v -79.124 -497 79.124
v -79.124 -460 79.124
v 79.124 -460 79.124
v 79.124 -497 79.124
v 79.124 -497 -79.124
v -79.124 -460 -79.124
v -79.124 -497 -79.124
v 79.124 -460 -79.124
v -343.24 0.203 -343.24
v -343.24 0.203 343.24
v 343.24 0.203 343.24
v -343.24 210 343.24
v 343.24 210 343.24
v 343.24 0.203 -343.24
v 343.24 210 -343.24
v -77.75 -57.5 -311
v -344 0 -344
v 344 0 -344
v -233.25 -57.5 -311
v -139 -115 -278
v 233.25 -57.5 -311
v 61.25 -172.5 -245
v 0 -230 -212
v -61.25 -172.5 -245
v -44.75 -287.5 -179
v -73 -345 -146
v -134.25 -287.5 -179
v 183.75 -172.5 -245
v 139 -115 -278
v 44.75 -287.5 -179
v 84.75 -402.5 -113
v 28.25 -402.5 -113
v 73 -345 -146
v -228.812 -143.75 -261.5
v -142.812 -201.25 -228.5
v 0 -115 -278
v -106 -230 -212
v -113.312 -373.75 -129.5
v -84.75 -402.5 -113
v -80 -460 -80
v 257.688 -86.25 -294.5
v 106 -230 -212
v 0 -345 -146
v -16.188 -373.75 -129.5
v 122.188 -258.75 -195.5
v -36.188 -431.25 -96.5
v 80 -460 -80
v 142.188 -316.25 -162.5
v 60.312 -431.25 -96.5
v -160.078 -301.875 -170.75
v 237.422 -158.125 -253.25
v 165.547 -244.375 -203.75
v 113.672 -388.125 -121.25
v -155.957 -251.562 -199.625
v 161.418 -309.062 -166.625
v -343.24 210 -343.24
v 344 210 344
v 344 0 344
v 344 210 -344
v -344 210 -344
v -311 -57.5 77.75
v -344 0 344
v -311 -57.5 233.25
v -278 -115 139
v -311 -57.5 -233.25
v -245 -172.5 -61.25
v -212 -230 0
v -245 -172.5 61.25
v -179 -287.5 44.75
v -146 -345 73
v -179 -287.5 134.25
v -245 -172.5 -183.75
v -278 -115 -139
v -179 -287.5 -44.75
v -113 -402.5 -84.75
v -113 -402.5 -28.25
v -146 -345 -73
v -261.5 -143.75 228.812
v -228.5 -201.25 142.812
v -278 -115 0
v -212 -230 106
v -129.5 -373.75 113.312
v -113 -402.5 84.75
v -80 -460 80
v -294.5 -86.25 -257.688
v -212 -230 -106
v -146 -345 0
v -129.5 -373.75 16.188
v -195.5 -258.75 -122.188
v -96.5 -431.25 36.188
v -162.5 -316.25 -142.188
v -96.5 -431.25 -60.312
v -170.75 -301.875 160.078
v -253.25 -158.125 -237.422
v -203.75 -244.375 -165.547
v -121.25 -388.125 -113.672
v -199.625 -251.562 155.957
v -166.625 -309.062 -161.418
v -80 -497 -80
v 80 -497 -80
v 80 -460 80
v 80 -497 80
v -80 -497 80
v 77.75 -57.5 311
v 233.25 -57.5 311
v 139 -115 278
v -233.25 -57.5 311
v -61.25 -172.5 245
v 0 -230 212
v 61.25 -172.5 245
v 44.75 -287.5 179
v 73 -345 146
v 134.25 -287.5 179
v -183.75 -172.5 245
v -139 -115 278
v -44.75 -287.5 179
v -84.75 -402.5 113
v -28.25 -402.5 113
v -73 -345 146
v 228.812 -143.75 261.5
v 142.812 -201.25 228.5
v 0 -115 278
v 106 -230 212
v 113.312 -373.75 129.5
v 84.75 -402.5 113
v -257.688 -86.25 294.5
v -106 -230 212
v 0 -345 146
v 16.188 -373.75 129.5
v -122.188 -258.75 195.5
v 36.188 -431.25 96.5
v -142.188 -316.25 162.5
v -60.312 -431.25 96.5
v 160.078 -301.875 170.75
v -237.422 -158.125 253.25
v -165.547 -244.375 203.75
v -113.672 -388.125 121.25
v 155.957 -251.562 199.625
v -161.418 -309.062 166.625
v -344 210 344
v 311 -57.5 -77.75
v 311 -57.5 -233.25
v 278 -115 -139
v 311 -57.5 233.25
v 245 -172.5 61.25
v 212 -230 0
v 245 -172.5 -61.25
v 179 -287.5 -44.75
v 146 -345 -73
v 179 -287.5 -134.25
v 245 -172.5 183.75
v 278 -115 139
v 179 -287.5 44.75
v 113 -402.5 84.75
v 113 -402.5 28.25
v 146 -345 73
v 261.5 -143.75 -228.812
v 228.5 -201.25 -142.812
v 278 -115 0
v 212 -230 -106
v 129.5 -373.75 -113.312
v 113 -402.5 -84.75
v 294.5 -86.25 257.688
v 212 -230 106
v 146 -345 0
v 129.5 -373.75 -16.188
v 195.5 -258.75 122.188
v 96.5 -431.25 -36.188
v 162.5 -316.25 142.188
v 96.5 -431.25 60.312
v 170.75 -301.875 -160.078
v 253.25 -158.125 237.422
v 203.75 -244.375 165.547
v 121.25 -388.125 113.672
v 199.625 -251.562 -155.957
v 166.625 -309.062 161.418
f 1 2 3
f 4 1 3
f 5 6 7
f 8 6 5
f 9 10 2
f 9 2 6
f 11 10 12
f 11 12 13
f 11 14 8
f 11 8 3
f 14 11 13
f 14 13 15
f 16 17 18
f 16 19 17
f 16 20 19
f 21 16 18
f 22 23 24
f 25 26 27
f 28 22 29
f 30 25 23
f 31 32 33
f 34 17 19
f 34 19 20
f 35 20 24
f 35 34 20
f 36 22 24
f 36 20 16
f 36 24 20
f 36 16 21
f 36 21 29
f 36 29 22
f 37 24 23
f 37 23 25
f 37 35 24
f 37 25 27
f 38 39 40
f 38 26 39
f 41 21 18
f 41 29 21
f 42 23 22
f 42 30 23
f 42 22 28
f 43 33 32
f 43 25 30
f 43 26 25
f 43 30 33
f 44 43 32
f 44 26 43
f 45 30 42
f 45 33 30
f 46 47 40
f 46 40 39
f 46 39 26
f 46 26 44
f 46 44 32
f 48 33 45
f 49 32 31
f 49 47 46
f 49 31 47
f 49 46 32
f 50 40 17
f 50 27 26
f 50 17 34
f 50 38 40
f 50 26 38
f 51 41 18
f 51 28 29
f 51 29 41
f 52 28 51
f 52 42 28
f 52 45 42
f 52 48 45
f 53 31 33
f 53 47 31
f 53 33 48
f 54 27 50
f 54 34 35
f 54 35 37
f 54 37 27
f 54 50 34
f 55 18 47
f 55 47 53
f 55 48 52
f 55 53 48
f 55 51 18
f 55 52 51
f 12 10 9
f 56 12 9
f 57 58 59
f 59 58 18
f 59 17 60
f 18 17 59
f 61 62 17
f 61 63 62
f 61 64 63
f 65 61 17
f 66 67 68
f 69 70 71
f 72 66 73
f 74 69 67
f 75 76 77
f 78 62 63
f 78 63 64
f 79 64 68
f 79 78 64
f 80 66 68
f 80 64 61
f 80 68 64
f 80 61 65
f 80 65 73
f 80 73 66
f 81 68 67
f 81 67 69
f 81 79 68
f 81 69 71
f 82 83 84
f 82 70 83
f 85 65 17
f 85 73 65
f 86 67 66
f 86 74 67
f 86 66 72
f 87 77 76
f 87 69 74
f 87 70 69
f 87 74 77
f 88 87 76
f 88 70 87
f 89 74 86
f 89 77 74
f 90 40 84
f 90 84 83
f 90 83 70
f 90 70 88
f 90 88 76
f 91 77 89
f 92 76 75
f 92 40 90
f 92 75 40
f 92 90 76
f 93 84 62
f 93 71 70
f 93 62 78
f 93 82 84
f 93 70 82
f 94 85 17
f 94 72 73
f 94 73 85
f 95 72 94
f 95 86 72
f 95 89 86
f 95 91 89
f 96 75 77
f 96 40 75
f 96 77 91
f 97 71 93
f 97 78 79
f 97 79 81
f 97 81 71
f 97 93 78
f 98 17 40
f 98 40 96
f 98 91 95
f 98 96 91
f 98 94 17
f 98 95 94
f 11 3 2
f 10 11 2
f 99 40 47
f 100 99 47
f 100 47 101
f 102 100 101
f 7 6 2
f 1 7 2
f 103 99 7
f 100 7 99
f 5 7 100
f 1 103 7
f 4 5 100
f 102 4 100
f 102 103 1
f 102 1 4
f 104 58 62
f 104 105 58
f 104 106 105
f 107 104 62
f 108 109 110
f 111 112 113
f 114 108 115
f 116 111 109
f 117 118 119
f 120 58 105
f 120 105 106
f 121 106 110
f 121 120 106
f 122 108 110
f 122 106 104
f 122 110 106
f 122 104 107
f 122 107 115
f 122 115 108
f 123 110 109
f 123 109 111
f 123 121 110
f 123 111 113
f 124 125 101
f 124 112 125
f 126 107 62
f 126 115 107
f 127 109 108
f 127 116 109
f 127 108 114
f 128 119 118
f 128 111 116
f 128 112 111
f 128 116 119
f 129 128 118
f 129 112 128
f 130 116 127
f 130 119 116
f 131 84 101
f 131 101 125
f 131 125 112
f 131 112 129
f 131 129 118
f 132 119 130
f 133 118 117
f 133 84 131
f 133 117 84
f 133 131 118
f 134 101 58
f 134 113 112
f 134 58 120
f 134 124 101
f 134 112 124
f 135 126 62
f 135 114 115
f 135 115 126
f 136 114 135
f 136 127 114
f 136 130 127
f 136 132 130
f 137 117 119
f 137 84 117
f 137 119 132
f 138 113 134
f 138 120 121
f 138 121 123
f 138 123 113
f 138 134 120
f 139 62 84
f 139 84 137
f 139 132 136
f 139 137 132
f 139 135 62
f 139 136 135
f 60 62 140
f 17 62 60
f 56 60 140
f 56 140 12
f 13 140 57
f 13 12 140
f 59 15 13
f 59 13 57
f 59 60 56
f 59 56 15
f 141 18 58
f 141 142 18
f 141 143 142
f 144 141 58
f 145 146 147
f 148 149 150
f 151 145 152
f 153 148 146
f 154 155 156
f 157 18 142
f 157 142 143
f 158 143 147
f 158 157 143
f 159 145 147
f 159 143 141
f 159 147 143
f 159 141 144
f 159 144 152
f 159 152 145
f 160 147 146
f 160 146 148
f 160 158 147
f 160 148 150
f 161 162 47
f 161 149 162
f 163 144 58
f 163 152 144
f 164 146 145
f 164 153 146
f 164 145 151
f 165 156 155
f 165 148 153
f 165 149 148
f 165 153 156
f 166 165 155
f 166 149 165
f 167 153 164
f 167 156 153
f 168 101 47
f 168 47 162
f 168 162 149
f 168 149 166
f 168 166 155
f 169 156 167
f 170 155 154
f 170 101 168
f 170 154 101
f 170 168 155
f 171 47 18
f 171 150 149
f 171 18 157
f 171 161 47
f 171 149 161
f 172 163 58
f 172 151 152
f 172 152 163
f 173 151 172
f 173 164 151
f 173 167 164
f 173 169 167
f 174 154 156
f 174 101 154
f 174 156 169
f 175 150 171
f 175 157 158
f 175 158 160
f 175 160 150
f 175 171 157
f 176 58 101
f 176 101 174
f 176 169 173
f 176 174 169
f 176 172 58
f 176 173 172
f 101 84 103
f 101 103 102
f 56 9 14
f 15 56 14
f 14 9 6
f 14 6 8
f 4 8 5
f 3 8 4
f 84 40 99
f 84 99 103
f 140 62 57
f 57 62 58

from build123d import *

# Parameters (mm, degrees)
CROQUIS3_W              = 688
CROQUIS3_H              = 688
SALIENTE_EXTRUIR1_DEPTH = 210
VACIADO2_T              = -0.76
CROQUIS4_W              = 160
CROQUIS4_H              = 160
CROQUIS4_W_2            = 158.247461632
CROQUIS4_H_2            = 158.247461632
SALIENTE_EXTRUIR2_DEPTH = 37


with BuildPart() as part:
    # Croquis1 → Recubrir1 section 0
    with BuildSketch(Plane(origin=(0, 0, 0), x_dir=(1, 0, 0), z_dir=(0, 1, 0))):
        with BuildLine():
            Line((-344, 344), (344, 344))
            Line((344, 344), (344, -344))
            Line((344, -344), (-344, -344))
            Line((-344, -344), (-344, 344))
        make_face()
    # Croquis2 → Recubrir1 section 1
    with BuildSketch(Plane(origin=(0, -460, 0), x_dir=(1, 0, 0), z_dir=(0, 1, 0))):
        with BuildLine():
            Line((-80, 80), (80, 80))
            Line((80, 80), (80, -80))
            Line((80, -80), (-80, -80))
            Line((-80, -80), (-80, 80))
        make_face()
    loft()

    # Croquis3 → Saliente-Extruir1 (add)
    with BuildSketch(Plane(origin=(0, 0, 0), x_dir=(1, 0, 0), z_dir=(0, 1, 0))):
        Rectangle(CROQUIS3_W, CROQUIS3_H)
    extrude(amount=SALIENTE_EXTRUIR1_DEPTH)

    # Vaciado2
    vaciado2_openings = [part.faces().sort_by_distance(p)[0] for p in [
        (0, -460, 0),
        (0, 210, 0),
    ]]
    offset(amount=VACIADO2_T, openings=vaciado2_openings, kind=Kind.INTERSECTION)

    # Croquis4 → Saliente-Extruir2 (add)
    with BuildSketch(Plane.XZ.offset(460)):
        Rectangle(CROQUIS4_W, CROQUIS4_H)
        Rectangle(CROQUIS4_W_2, CROQUIS4_H_2, mode=Mode.SUBTRACT)
    extrude(amount=SALIENTE_EXTRUIR2_DEPTH)


solid = part.part
